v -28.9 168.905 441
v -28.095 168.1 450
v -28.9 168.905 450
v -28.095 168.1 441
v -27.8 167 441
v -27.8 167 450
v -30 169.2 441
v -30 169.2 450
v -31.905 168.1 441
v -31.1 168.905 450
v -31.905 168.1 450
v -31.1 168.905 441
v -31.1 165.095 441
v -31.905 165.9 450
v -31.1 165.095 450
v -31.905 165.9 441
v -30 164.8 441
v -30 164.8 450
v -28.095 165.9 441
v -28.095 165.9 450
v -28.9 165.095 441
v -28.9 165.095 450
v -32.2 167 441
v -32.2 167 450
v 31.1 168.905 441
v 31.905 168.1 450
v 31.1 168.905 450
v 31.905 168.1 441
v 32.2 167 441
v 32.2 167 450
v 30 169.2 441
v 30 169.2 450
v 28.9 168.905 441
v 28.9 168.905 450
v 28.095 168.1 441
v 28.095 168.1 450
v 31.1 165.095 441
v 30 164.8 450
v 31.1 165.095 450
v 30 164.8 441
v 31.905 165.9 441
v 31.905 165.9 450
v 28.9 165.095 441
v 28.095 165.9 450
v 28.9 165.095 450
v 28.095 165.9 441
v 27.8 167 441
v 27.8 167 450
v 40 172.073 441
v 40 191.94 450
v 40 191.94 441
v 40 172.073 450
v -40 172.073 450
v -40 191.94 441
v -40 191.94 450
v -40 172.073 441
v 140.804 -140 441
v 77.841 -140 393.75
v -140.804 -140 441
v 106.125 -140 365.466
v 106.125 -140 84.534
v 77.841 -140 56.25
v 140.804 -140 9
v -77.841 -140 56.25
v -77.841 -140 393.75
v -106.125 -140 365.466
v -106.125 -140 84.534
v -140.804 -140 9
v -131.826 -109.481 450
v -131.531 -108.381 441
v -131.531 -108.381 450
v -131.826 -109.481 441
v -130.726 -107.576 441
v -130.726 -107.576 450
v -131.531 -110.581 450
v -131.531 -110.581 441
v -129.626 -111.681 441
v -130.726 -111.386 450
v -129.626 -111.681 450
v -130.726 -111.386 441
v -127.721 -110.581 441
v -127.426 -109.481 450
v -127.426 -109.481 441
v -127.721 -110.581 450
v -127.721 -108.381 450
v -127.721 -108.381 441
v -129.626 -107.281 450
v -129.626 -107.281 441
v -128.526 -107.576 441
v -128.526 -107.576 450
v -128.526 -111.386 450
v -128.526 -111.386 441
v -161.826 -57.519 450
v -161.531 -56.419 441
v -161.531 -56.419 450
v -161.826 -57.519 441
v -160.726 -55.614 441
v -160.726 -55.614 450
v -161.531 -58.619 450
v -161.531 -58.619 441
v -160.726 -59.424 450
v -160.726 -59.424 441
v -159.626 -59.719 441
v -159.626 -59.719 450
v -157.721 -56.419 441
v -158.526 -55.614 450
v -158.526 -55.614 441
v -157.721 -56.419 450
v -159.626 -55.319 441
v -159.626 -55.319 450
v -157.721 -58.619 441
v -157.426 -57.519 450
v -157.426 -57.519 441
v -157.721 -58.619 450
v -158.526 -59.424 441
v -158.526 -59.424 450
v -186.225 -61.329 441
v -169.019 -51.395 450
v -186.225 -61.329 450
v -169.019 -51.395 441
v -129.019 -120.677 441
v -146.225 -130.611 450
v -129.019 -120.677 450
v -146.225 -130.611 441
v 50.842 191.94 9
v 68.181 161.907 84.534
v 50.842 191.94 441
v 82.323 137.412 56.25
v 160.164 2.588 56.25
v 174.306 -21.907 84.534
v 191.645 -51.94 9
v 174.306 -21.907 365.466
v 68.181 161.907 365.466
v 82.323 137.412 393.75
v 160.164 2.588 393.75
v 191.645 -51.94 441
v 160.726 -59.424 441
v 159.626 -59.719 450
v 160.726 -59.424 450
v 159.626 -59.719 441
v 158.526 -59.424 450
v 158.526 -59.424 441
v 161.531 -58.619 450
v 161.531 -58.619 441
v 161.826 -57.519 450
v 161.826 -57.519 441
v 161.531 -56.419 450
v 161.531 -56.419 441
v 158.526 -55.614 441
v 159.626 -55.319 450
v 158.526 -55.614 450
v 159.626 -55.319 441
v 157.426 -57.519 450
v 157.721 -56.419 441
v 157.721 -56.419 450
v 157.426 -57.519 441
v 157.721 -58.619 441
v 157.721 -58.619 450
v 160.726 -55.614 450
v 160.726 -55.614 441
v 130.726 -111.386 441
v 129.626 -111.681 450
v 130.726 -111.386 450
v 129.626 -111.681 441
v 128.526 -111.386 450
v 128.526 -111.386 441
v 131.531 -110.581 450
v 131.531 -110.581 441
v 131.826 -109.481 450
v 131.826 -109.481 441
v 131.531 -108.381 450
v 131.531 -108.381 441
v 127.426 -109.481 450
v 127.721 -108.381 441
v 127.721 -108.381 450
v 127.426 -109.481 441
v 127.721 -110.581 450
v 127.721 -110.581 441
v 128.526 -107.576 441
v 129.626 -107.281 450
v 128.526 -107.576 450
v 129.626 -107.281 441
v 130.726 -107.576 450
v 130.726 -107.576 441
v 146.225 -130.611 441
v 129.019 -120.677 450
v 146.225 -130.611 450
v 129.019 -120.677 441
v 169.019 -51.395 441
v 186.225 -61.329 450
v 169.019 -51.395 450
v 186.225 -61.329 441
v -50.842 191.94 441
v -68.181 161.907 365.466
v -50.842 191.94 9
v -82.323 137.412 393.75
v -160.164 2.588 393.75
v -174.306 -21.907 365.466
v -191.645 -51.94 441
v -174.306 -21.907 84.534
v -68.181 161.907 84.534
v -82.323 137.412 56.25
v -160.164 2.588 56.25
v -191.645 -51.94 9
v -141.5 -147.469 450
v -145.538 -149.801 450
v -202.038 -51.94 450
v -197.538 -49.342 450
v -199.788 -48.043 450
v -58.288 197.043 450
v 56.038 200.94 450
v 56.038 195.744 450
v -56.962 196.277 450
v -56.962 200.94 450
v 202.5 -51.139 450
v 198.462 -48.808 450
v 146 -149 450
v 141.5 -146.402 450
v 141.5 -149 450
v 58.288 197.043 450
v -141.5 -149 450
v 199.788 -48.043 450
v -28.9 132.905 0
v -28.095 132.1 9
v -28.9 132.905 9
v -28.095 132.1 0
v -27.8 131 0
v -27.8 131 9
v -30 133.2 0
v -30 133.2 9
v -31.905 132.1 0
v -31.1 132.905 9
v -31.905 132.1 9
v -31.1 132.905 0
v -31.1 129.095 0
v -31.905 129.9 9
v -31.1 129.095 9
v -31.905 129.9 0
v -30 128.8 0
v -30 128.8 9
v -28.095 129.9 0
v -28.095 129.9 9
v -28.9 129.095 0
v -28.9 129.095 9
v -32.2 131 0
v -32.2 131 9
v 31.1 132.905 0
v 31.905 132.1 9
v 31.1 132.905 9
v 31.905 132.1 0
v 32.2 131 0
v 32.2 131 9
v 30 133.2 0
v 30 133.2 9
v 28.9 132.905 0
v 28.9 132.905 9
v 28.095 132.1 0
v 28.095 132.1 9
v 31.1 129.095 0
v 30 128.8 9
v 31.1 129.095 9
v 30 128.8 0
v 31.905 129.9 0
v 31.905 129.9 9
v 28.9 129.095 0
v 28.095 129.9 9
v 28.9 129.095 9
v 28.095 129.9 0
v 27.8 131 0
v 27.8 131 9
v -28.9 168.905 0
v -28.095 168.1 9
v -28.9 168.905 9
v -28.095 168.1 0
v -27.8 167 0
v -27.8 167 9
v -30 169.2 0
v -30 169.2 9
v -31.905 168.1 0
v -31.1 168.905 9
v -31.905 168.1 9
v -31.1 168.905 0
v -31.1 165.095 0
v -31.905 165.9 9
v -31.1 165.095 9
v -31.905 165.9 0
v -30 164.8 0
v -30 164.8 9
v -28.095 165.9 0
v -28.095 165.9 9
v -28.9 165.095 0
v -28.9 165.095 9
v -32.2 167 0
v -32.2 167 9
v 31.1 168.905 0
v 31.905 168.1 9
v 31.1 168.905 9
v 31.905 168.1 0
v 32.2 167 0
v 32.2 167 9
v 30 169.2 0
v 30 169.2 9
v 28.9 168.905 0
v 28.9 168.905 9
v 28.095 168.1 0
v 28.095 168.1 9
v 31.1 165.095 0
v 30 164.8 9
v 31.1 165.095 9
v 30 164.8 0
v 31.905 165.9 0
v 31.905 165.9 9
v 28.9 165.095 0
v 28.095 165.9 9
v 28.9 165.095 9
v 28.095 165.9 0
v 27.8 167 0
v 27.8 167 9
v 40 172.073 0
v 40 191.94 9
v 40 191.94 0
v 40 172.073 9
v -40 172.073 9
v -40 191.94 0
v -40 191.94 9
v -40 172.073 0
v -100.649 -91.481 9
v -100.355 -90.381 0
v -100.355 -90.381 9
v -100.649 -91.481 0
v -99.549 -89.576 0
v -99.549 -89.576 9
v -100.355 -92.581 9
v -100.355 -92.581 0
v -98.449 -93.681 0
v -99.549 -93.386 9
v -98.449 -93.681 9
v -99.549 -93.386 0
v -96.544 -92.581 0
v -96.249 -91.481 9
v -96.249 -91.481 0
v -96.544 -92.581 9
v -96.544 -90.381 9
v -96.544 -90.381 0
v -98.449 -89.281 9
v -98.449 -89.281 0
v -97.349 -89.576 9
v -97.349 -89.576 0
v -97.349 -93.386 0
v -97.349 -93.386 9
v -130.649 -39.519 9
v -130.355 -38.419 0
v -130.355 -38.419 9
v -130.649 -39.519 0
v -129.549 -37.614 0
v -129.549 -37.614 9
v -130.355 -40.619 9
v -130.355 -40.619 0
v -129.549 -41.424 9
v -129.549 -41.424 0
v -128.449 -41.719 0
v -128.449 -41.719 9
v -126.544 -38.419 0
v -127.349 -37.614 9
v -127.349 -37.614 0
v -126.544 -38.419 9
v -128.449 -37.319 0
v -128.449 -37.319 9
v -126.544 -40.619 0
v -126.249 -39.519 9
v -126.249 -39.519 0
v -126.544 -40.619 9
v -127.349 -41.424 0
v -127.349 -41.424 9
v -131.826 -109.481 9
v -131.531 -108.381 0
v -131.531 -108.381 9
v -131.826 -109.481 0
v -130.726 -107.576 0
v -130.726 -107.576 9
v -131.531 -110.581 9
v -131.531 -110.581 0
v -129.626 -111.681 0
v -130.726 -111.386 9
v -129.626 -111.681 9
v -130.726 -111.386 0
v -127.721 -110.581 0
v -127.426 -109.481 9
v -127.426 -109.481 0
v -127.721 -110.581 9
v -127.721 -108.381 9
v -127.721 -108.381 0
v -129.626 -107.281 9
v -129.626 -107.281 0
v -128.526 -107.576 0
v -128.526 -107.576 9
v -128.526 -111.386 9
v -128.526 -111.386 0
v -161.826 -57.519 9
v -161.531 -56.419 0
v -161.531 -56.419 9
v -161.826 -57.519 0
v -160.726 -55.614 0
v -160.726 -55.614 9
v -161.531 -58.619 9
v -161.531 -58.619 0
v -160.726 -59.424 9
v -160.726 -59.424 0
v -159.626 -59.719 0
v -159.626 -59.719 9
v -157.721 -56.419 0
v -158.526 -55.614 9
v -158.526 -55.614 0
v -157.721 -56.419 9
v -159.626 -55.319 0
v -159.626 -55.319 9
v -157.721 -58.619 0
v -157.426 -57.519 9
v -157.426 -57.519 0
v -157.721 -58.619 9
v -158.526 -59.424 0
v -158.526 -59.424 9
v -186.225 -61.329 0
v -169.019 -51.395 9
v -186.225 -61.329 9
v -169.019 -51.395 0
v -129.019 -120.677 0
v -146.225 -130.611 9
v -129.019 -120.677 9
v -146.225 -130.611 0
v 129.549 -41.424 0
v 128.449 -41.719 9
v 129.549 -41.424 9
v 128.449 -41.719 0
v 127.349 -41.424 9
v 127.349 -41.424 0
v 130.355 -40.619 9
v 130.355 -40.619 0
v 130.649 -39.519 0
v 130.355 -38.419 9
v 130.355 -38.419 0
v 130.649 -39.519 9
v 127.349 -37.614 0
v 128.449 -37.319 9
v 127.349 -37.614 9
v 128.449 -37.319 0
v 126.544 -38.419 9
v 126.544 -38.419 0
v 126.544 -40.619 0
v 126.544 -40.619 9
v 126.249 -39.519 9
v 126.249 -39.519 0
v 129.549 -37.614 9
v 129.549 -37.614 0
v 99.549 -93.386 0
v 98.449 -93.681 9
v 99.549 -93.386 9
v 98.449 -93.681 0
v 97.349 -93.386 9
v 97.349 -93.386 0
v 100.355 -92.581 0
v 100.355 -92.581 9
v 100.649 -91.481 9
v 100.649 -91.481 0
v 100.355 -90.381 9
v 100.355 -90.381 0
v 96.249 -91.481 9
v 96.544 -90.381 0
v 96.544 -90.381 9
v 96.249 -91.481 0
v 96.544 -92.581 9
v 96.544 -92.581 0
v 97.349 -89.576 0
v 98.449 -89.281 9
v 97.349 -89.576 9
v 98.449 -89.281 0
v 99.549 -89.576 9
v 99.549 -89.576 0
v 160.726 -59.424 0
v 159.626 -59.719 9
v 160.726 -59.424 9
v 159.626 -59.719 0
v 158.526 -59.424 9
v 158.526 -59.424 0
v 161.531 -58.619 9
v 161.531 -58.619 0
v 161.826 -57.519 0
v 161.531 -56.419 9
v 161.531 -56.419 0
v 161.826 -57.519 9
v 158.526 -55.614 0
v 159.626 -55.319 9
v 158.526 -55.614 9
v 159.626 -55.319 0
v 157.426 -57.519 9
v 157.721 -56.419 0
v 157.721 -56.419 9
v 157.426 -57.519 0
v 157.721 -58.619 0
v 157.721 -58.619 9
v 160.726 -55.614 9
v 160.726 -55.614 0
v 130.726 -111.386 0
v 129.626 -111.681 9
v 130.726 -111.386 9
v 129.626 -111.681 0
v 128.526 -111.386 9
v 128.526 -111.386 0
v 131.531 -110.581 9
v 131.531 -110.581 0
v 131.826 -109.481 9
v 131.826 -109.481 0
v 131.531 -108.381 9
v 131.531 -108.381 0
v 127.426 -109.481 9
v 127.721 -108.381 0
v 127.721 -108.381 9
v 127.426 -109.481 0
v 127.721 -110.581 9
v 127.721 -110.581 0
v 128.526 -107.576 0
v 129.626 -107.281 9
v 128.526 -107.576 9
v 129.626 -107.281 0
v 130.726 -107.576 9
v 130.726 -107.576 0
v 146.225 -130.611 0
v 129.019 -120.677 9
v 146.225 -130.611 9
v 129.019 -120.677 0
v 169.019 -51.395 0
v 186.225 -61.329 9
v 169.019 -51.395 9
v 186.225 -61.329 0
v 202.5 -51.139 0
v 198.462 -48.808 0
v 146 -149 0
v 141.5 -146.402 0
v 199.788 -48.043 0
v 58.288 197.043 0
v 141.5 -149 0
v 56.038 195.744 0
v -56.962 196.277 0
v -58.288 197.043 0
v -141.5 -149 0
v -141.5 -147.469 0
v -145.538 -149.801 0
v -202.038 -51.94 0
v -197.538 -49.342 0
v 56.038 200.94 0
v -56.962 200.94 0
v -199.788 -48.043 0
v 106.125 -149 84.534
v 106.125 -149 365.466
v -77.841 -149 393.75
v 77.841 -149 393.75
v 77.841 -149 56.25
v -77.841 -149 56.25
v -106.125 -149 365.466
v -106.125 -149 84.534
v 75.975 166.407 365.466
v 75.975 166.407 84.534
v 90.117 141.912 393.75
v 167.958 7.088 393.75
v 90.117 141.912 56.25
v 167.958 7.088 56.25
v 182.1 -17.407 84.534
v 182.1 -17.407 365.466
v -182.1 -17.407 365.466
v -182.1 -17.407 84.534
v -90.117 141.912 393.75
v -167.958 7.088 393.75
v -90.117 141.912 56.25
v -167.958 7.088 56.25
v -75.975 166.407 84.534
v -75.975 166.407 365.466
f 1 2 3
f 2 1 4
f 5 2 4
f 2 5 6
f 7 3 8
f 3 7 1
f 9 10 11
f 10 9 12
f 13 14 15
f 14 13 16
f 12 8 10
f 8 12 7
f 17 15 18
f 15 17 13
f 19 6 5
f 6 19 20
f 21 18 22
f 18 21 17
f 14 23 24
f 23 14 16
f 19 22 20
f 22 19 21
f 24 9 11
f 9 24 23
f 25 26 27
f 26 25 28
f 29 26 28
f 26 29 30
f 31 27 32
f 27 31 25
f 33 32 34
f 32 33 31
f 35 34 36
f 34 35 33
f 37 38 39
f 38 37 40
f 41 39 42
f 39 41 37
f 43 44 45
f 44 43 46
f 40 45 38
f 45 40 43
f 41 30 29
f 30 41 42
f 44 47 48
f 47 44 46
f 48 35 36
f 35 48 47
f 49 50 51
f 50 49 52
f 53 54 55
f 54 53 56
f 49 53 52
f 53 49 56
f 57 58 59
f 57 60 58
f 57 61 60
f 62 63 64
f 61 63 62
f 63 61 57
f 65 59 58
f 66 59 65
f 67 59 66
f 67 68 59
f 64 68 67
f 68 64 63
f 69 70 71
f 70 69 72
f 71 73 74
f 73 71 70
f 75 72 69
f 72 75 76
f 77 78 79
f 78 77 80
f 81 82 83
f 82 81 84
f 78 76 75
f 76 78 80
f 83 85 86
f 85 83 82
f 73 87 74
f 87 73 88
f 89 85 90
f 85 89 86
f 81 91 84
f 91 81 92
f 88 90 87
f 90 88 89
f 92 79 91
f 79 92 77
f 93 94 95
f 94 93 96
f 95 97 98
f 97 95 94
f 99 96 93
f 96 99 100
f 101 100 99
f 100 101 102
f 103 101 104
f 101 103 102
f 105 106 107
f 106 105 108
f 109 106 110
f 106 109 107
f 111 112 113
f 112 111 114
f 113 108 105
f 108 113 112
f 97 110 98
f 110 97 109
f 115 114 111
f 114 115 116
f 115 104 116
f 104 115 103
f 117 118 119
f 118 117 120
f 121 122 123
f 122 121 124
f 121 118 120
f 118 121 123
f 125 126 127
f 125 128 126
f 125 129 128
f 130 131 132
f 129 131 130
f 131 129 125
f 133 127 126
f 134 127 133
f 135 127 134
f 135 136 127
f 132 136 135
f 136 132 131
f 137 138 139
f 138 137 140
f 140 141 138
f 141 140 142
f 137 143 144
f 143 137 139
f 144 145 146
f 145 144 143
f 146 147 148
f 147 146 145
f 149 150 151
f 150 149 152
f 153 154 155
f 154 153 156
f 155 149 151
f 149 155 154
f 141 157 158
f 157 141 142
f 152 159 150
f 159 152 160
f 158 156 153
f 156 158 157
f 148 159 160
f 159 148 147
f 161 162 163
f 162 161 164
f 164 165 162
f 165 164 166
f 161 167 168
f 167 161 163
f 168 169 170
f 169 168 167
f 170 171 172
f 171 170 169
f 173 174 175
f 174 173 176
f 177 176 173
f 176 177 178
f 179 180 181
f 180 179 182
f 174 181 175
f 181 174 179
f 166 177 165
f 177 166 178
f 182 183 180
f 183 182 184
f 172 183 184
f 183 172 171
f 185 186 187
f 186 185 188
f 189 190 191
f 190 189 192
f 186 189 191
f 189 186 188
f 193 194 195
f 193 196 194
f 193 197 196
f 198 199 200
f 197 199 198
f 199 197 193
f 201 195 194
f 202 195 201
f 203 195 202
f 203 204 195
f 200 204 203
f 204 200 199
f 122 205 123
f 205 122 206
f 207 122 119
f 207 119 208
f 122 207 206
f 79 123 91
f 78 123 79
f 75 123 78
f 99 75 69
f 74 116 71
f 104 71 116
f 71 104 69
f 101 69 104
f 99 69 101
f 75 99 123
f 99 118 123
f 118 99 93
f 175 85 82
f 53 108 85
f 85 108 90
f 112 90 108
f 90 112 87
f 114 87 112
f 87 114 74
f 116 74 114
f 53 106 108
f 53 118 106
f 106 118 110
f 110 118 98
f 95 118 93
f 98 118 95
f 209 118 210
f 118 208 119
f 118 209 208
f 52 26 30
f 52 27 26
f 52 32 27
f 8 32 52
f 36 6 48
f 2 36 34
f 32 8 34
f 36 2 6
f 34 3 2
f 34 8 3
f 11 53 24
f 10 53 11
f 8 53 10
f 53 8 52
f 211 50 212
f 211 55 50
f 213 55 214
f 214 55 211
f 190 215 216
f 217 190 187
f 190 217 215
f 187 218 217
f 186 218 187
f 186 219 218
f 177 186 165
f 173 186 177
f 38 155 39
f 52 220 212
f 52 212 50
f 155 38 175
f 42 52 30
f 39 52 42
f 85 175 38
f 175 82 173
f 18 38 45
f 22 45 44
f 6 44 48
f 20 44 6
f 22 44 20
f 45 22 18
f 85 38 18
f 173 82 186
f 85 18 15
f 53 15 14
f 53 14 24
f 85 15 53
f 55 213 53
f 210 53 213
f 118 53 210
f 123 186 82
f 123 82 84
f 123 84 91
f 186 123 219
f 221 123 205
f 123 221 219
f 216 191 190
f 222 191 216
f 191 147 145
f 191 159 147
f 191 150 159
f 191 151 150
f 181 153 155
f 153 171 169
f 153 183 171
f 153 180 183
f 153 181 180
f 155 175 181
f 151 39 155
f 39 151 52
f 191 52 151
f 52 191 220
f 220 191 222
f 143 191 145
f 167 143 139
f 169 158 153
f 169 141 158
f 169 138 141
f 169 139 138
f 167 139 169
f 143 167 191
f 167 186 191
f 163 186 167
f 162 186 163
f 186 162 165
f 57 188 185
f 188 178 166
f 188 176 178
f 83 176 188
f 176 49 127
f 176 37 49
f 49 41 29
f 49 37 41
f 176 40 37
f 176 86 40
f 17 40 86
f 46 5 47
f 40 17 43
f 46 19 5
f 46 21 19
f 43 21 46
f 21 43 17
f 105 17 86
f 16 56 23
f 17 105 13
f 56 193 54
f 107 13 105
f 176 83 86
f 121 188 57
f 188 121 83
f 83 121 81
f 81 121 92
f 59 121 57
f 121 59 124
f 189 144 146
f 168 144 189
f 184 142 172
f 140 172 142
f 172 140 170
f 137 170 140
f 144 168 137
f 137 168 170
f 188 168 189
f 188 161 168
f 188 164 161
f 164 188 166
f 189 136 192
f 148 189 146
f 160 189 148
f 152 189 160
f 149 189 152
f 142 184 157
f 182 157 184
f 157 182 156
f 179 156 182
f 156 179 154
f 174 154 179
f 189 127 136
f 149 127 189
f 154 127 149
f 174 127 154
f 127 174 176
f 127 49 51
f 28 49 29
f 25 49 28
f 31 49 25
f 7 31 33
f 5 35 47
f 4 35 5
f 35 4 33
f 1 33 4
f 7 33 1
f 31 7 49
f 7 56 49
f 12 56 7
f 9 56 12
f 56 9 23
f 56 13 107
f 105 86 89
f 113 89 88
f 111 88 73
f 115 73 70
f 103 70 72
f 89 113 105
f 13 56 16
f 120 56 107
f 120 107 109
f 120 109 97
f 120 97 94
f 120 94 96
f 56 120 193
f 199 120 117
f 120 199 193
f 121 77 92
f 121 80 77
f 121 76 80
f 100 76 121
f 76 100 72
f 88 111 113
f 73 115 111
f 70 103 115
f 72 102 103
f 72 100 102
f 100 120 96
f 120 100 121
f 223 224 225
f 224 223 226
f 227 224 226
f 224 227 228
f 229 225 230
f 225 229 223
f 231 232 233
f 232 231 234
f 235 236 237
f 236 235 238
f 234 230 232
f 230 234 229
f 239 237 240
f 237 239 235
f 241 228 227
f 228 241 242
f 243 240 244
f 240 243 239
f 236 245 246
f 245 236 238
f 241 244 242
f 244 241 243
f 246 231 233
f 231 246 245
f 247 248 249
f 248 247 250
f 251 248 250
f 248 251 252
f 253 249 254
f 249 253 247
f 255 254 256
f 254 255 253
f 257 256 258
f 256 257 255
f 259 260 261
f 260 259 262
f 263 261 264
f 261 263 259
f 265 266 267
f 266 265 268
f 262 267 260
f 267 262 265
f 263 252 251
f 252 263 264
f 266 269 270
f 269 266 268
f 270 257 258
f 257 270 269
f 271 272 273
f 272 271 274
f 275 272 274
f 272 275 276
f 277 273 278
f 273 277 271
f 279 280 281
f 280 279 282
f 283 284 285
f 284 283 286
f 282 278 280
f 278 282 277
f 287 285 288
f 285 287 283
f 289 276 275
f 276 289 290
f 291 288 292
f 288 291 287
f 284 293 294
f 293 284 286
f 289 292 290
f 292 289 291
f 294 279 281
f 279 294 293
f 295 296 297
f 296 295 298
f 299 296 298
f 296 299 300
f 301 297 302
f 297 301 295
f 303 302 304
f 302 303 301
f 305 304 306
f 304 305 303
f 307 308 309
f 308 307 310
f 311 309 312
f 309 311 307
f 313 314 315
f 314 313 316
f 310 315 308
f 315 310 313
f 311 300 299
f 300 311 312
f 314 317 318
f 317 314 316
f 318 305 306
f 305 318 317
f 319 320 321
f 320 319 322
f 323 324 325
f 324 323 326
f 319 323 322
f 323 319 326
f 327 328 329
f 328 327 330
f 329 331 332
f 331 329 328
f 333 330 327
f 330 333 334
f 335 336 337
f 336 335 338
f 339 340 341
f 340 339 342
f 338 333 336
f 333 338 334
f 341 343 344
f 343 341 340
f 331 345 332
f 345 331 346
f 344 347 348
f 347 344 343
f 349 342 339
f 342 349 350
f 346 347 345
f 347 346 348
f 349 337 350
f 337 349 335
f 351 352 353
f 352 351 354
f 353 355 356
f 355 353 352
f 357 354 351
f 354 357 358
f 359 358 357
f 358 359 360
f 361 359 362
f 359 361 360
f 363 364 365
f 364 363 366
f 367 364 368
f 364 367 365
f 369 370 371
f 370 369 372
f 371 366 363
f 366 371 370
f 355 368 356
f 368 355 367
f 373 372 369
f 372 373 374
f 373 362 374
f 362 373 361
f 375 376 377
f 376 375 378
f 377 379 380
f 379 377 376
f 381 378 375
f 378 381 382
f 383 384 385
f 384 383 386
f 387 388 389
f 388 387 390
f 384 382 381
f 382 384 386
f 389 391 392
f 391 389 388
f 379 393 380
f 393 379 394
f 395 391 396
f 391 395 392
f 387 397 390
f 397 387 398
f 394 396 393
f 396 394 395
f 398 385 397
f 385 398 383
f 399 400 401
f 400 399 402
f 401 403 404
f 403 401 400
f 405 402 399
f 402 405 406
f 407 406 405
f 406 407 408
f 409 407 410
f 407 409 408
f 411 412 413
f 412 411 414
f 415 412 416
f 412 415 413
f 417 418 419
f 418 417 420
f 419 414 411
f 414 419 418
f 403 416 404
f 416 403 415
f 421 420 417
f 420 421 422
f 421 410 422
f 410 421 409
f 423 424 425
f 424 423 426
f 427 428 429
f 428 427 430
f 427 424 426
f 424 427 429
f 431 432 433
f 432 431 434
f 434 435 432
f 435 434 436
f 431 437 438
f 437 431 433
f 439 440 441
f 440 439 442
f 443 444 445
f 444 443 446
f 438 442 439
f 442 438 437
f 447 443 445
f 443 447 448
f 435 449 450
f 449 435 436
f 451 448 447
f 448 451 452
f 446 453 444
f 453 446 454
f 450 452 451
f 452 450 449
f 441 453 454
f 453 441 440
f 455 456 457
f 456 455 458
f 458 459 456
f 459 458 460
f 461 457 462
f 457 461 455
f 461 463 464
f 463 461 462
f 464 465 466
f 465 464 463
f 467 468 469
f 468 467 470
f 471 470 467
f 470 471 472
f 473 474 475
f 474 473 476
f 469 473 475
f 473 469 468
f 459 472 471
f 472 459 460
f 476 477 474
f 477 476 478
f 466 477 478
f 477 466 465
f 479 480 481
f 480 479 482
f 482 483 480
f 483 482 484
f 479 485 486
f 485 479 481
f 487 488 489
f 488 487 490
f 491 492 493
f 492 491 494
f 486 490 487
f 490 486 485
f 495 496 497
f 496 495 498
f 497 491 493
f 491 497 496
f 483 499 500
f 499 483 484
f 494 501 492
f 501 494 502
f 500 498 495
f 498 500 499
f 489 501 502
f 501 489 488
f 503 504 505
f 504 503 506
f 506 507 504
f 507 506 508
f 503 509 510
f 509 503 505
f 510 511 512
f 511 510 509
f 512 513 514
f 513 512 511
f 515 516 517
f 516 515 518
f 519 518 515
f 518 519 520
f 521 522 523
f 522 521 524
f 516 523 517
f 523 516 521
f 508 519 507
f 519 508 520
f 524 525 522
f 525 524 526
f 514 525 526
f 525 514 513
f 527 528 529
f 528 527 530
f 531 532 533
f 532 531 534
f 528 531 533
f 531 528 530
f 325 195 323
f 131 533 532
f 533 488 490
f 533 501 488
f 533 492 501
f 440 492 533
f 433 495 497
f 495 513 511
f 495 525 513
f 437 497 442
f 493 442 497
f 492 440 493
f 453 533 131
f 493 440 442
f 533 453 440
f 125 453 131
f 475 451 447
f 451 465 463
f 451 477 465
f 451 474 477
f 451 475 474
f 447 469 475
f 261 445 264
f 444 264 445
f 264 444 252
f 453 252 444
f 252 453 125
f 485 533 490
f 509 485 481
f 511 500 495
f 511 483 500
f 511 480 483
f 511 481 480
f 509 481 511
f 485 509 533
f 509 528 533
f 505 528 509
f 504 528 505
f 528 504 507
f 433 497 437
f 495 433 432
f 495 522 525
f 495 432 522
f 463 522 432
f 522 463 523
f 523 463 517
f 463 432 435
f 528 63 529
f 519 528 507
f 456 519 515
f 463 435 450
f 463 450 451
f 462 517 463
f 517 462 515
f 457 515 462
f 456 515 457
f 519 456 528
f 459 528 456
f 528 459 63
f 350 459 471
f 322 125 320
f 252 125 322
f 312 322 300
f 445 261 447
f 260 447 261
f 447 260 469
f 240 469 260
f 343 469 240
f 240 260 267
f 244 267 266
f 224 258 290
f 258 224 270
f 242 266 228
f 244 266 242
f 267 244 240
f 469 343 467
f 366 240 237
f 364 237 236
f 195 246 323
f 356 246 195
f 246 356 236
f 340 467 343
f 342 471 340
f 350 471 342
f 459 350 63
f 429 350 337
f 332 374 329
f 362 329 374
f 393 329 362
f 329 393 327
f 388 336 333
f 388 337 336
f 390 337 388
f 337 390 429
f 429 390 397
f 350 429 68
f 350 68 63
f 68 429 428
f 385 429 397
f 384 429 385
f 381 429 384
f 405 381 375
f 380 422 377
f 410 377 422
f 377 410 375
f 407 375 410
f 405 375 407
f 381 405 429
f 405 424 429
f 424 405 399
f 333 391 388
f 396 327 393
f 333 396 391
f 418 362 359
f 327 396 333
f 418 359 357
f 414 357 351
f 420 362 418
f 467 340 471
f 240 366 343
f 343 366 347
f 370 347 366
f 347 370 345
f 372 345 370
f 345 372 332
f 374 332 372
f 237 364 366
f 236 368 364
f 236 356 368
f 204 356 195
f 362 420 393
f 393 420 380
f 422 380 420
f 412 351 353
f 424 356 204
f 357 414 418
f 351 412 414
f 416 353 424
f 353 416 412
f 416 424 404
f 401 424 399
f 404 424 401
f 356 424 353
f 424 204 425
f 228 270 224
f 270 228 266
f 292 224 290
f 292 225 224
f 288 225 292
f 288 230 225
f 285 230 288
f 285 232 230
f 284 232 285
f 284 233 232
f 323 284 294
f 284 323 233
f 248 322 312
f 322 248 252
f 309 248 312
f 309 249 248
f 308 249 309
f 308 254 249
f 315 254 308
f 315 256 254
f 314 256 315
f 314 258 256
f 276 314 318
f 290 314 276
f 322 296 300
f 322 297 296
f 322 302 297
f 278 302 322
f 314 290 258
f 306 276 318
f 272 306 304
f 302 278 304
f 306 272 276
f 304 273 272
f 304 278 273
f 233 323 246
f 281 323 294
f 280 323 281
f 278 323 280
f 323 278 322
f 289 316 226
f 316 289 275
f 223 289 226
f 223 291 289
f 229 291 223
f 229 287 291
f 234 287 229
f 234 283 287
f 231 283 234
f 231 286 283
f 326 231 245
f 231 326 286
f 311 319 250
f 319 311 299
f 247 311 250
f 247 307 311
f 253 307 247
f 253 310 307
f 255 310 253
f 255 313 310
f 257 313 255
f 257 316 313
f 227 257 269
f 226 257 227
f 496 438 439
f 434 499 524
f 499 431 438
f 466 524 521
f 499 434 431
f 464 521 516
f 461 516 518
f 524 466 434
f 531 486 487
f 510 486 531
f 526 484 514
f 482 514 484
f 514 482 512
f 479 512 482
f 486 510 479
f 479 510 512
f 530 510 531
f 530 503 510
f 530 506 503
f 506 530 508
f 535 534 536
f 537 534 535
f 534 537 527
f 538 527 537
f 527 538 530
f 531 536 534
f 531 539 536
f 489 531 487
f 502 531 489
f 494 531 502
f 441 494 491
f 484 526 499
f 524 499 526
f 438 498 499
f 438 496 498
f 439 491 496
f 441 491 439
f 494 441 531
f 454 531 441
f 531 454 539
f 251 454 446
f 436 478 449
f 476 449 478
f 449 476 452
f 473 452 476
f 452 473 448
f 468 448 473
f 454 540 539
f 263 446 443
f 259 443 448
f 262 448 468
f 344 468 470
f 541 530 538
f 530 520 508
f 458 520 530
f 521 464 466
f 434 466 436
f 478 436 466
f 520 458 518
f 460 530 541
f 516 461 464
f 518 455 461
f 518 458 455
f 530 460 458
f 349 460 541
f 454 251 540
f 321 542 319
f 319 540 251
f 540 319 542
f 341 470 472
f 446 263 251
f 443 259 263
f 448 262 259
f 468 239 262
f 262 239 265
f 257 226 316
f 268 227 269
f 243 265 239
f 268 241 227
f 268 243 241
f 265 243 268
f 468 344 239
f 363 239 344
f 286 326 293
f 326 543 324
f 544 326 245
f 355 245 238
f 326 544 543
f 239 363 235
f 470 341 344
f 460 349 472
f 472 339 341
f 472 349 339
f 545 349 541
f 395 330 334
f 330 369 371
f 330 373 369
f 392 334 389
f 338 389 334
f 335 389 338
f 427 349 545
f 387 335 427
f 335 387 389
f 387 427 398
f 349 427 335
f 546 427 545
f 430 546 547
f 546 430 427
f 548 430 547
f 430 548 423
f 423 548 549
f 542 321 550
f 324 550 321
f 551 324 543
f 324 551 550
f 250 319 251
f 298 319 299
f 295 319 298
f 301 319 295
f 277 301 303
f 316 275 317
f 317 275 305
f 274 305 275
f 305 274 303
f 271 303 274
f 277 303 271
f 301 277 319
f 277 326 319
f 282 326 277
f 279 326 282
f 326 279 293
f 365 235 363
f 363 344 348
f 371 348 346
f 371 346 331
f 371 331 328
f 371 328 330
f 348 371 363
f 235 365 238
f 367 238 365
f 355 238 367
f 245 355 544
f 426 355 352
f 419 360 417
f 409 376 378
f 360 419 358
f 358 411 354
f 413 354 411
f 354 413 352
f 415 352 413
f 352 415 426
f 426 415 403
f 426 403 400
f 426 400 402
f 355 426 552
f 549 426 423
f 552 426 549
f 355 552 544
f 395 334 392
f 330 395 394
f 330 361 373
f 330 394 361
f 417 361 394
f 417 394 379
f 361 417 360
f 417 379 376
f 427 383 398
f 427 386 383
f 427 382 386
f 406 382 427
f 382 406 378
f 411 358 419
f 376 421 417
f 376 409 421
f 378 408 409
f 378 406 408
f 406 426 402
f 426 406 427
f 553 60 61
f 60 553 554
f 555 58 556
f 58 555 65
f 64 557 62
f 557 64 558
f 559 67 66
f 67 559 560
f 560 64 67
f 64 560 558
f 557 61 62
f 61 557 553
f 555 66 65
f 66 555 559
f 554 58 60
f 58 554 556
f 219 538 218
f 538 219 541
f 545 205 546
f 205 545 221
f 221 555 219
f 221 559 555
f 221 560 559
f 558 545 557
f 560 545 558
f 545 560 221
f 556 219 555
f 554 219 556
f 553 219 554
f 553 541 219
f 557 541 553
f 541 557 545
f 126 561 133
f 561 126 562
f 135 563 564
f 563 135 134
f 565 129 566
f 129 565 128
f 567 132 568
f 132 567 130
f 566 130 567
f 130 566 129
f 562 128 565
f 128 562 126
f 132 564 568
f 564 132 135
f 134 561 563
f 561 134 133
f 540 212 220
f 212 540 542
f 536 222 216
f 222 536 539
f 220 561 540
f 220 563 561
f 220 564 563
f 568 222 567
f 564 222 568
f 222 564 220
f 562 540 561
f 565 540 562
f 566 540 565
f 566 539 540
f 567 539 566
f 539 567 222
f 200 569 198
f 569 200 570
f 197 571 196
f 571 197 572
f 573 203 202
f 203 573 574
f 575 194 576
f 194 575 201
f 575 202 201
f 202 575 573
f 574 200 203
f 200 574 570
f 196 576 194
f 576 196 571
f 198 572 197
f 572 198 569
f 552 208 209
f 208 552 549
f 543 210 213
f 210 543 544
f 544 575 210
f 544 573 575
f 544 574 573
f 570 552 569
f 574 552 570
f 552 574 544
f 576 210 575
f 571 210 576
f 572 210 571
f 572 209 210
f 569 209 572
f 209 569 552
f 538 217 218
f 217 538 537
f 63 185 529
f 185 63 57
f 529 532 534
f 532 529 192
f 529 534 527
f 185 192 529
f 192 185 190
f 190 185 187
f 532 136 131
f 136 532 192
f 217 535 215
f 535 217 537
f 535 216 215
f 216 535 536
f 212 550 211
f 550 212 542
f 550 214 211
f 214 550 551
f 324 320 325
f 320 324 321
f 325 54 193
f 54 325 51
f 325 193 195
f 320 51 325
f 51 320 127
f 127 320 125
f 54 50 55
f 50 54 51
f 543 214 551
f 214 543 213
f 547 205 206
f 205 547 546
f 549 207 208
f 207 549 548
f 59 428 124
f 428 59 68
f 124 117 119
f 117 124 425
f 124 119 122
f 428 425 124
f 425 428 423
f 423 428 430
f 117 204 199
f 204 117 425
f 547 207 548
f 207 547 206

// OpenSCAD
radius = 175; // pretty close to 150/cos(30)
radius2 = radius/cos(30);
radius3 = radius2/cos(30)/2;
//offset = 150-radius;
offset = 0;
thickness = 9;
h = 450;
w = 283;
corner = 40;

module plywood(bottom) {
  difference() {
    //intersection() {
//      cube([2*radius, 300, 9], center=true);
//      translate([0, offset, 0]) rotate([0, 0, 30])
//	cylinder(r=2*radius, h=20, center=true, $fn=3);
//    }
    translate([0, offset, 0]) cylinder(r=radius2+20, h=thickness, center=true, $fn=6);
    for (a = [0, 120, 240]) {
      translate([0, offset, 0]) rotate([0, 0, a]) {
	translate([-30, radius-8, 0])
	  cylinder(r=2.2, h=20, center=true, $fn=12);
	translate([30, radius-8, 0])
	  cylinder(r=2.2, h=20, center=true, $fn=12);
	if (bottom) {
	translate([-30, radius-44, 0])
	  cylinder(r=2.2, h=20, center=true, $fn=12);
	translate([30, radius-44, 0])
	  cylinder(r=2.2, h=20, center=true, $fn=12);
	}
   translate([0,radius2,0])
     cube([80,60,thickness+1],center=true);
   translate([0,-170,0])
     cube([400,60,thickness+1],center=true);
      }
    }
  }
}

module frontpanel() {
   difference() {
	cube([w,thickness,h]);
	difference(){
	translate([w*.125,-.5,h*.125]) cube([w*.75,thickness+1,h*.75]);
	translate([w*.125,5,h*.125]) rotate([0,45,0]) translate([0,-1,0]) cube([corner,thickness+2,corner],center=true);
	translate([w*(.125+.75),5,h*.125]) rotate([0,45,0]) translate([0,-1,0]) cube([corner,thickness+2,corner],center=true);
	translate([w*.125,5,h*(.125+.75)]) rotate([0,45,0]) translate([0,-1,0]) cube([corner,thickness+2,corner],center=true);
	translate([w*(.125+.75),5,h*(.125+.75)]) rotate([0,45,0]) translate([0,-1,0]) cube([corner,thickness+2,corner],center=true);
	}
	}
}

module sidepanel() {
	cube([113,thickness,h]);
}

//translate([0, offset, 10])
//for (a = [0, 120, 240]) rotate([0, 0, a])
//translate([0, radius3, 0]) jig();

//use <motor_end.scad>;
//% rotate([180,0,0]) translate([0,-radius-4,0]) motor_end();


translate([0, 0, h-thickness/2]) plywood(0);
translate([0, 0, thickness/2]) plywood(1);

for (a = [0, 120, 240]) {
rotate([0,0,a]) translate([-w/2,-140-thickness,0]) frontpanel();
rotate([0,0,a]) translate([w/2+thickness/2,-140-thickness,0]) rotate([0,0,60]) sidepanel();
}

//%translate([0,0,thickness]) cylinder(r=125,h=thickness,center=true);

//% translate([0, offset, 0]) cylinder(r=radius2, h=10, center=true, $fn=6);

//HEATED_BED = 8 * 25.4;
//% translate([0, 10, 10]) cube([HEATED_BED, HEATED_BED, 2], center=true);

//use <rod.scad>;
//% translate([-90, 20, 20]) rotate([0, 0, 60]) rod();
//% translate([-40, 20, 20]) rotate([0, 0, 60]) rod();

//use <platform.scad>;
//% translate([HEATED_BED/2, 10-HEATED_BED/2, 20]) rotate([0, 0, 60]) platform();
